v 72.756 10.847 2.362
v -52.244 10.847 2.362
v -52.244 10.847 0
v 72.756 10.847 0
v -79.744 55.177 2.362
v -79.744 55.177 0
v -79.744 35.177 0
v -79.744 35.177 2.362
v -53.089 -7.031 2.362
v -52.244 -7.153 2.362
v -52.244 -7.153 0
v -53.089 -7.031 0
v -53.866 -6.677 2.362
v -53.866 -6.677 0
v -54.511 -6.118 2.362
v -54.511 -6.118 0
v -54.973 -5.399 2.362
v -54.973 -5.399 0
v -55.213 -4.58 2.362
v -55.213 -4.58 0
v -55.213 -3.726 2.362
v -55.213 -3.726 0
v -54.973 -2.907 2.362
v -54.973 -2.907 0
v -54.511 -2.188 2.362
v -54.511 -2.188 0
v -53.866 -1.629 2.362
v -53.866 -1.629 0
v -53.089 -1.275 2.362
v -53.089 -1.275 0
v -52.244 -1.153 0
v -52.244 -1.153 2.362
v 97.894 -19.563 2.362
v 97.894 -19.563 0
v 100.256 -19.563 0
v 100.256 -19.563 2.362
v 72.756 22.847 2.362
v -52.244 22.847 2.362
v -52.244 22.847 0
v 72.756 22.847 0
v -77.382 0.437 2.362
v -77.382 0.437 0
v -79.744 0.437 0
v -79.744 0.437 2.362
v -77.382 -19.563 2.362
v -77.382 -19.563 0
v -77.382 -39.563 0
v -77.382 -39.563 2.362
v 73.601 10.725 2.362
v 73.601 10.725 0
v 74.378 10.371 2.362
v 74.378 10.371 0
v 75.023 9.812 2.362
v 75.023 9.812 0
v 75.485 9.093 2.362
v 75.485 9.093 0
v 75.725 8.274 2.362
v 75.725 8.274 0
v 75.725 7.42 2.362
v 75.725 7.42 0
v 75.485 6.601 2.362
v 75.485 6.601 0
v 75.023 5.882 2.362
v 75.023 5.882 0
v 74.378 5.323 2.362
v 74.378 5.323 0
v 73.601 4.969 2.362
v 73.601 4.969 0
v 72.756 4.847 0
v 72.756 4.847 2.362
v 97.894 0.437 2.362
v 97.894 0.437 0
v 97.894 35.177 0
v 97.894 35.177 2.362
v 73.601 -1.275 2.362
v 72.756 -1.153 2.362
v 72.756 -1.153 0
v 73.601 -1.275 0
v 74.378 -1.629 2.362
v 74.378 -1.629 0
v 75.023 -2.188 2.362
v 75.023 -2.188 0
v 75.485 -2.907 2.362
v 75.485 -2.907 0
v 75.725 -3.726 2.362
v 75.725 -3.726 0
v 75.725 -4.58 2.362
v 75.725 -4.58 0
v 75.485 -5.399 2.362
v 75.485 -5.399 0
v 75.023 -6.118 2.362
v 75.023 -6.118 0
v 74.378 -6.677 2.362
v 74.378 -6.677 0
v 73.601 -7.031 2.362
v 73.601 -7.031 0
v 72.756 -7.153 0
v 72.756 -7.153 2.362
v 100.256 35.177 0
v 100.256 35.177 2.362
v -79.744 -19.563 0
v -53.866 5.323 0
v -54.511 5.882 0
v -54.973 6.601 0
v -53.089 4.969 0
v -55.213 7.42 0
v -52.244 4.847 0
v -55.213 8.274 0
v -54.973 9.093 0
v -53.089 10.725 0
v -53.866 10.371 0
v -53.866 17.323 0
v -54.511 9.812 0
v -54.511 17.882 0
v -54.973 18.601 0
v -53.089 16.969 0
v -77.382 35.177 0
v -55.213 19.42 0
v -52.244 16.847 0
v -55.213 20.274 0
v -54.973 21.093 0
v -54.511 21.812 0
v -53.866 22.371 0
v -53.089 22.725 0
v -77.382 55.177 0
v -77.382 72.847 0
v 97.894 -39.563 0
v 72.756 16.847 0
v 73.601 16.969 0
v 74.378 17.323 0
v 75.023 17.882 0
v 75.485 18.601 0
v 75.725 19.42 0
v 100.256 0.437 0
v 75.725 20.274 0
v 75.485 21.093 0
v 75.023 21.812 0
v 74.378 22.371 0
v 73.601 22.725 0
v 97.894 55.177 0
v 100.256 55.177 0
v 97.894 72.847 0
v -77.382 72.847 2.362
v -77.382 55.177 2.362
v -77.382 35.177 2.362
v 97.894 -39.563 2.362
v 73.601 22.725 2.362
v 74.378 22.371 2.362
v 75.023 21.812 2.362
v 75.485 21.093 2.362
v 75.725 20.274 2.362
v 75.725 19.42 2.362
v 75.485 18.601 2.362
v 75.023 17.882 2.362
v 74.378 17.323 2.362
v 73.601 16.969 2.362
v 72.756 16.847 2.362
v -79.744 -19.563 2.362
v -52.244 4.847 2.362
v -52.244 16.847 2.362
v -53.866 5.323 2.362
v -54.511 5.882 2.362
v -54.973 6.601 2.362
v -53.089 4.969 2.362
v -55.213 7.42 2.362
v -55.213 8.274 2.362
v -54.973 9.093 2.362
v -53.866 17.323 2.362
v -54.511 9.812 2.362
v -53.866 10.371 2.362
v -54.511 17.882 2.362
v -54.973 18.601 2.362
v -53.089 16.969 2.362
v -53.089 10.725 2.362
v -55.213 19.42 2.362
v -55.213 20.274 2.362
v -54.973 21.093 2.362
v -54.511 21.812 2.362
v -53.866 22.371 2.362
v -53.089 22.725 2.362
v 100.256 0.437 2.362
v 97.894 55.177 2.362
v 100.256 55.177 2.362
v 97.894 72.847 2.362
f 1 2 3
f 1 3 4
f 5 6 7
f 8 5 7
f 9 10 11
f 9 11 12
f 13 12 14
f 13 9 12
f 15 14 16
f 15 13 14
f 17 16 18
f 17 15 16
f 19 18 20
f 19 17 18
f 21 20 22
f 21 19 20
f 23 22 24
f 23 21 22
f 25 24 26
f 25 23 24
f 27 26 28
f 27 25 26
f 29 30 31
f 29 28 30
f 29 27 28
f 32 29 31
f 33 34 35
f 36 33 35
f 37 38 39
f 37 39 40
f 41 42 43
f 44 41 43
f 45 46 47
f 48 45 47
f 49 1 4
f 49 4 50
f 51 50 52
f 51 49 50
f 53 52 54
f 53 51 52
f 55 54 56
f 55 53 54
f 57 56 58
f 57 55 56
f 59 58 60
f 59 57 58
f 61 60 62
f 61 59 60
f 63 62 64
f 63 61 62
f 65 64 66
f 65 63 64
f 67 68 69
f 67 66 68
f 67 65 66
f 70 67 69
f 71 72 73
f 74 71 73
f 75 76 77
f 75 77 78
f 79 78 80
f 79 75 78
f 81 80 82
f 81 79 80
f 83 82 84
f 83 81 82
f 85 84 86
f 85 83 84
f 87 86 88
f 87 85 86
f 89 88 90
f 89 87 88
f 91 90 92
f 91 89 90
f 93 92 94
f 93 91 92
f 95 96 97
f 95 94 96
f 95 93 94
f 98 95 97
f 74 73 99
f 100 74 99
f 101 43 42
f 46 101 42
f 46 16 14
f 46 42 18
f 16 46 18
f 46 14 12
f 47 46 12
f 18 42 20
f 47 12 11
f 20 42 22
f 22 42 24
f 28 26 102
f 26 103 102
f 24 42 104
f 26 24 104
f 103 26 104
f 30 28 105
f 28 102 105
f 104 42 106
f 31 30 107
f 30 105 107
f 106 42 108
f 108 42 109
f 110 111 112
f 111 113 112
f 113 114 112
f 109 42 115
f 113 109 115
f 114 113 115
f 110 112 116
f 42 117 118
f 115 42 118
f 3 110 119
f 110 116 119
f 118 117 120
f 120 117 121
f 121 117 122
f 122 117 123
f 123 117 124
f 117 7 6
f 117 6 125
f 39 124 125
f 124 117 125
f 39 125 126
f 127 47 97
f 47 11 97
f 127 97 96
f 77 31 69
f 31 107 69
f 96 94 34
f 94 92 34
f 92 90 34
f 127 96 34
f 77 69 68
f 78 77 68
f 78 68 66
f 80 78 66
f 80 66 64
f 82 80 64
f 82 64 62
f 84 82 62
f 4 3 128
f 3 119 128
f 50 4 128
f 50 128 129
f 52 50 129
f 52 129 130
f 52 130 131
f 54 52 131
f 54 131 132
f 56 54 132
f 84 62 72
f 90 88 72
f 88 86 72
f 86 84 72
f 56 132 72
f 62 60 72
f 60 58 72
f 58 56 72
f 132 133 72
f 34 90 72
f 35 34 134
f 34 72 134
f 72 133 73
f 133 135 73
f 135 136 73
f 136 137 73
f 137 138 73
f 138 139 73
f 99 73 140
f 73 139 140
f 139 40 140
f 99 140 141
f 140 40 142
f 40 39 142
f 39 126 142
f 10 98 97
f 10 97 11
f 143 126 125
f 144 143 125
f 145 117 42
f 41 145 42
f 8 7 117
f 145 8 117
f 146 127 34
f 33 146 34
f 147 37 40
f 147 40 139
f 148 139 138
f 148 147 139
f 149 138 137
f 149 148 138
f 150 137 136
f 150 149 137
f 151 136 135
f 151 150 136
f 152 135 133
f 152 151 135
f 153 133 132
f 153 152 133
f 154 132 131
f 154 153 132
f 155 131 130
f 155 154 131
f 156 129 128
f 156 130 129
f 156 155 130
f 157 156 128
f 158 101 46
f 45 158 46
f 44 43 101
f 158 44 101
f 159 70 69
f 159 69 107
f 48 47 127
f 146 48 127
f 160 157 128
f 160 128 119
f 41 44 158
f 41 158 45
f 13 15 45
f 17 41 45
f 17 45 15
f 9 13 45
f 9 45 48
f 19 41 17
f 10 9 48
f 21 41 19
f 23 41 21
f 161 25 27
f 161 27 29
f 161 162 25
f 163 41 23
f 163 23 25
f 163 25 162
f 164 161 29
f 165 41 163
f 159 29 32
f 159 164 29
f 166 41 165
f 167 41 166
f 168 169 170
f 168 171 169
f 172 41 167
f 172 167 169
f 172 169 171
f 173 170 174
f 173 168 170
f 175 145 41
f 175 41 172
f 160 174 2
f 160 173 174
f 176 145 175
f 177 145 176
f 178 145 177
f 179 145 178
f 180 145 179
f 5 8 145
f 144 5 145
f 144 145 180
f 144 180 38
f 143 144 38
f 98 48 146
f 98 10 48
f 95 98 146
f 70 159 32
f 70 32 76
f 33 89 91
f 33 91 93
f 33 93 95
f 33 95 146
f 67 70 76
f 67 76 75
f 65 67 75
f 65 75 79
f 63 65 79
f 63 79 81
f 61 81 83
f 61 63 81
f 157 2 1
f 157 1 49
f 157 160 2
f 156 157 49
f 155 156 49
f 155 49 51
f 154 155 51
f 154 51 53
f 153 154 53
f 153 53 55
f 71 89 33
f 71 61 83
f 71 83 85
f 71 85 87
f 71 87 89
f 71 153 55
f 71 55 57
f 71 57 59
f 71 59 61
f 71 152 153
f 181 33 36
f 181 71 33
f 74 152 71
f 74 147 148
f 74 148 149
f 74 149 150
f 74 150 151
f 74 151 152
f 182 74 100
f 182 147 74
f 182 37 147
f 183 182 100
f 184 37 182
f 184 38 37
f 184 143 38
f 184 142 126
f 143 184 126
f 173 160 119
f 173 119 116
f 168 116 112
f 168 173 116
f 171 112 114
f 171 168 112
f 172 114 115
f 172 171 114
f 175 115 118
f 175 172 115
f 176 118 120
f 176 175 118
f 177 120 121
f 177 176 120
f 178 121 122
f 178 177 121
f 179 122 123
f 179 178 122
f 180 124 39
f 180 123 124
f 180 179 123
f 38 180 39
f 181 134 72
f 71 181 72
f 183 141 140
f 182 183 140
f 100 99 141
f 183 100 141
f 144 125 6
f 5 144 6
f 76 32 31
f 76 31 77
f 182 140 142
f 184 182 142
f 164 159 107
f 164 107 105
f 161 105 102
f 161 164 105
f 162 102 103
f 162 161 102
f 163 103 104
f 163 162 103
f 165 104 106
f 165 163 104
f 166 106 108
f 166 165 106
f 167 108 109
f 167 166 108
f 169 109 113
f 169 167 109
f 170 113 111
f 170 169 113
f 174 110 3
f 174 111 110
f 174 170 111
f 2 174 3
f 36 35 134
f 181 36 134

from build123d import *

# Parameters (mm, degrees)
BOSS_EXTRUDE1_DEPTH = 2.3622
CUT_EXTRUDE1_DEPTH  = 124.949730405


with BuildPart() as part:
    # Sketch1 → Boss-Extrude1 (new body)
    with BuildSketch(Plane.XY):
        Polygon((-77.381787364, 72.847015101), (-77.381787364, 55.177029121), (-79.743987364, 55.177029121), (-79.743987364, 35.177029121), (-77.381787364, 35.177029121), (-77.381787364, 0.437015101), (-79.743987364, 0.437015101), (-79.743987364, -19.562984899), (-77.381787364, -19.562984899), (-77.381787364, -39.562984899), (97.893812636, -39.562984899), (97.893812636, -19.562984899), (100.256012636, -19.562984899), (100.256012636, 0.437015101), (97.893812636, 0.437015101), (97.893812636, 35.177029121), (100.256012636, 35.177029121), (100.256012636, 55.177029121), (97.893812636, 55.177029121), (97.893812636, 72.847015101), align=None)
    extrude(amount=BOSS_EXTRUDE1_DEPTH)

    # Sketch2 → Cut-Extrude1 (cut, through all)
    with BuildSketch(Plane.XY.offset(2.3622)):
        with BuildLine():
            Line((-52.243987364, 22.847015101), (72.756012636, 22.847015101))
            ThreePointArc((72.756012636, 22.847015101), (75.756012636, 19.847015101), (72.756012636, 16.847015101))
            Line((72.756012636, 16.847015101), (-52.243987364, 16.847015101))
            ThreePointArc((-52.243987364, 16.847015101), (-55.243987364, 19.847015101), (-52.243987364, 22.847015101))
        make_face()
        with BuildLine():
            Line((-52.243987364, 10.847015101), (72.756012636, 10.847015101))
            ThreePointArc((72.756012636, 10.847015101), (75.756012636, 7.847015101), (72.756012636, 4.847015101))
            Line((72.756012636, 4.847015101), (-52.243987364, 4.847015101))
            ThreePointArc((-52.243987364, 4.847015101), (-55.243987364, 7.847015101), (-52.243987364, 10.847015101))
        make_face()
        with BuildLine():
            Line((-52.243987364, -1.152984899), (72.756012636, -1.152984899))
            ThreePointArc((72.756012636, -1.152984899), (75.756012636, -4.152984899), (72.756012636, -7.152984899))
            Line((72.756012636, -7.152984899), (-52.243987364, -7.152984899))
            ThreePointArc((-52.243987364, -7.152984899), (-55.243987364, -4.152984899), (-52.243987364, -1.152984899))
        make_face()
    extrude(amount=-CUT_EXTRUDE1_DEPTH, mode=Mode.SUBTRACT)


solid = part.part
